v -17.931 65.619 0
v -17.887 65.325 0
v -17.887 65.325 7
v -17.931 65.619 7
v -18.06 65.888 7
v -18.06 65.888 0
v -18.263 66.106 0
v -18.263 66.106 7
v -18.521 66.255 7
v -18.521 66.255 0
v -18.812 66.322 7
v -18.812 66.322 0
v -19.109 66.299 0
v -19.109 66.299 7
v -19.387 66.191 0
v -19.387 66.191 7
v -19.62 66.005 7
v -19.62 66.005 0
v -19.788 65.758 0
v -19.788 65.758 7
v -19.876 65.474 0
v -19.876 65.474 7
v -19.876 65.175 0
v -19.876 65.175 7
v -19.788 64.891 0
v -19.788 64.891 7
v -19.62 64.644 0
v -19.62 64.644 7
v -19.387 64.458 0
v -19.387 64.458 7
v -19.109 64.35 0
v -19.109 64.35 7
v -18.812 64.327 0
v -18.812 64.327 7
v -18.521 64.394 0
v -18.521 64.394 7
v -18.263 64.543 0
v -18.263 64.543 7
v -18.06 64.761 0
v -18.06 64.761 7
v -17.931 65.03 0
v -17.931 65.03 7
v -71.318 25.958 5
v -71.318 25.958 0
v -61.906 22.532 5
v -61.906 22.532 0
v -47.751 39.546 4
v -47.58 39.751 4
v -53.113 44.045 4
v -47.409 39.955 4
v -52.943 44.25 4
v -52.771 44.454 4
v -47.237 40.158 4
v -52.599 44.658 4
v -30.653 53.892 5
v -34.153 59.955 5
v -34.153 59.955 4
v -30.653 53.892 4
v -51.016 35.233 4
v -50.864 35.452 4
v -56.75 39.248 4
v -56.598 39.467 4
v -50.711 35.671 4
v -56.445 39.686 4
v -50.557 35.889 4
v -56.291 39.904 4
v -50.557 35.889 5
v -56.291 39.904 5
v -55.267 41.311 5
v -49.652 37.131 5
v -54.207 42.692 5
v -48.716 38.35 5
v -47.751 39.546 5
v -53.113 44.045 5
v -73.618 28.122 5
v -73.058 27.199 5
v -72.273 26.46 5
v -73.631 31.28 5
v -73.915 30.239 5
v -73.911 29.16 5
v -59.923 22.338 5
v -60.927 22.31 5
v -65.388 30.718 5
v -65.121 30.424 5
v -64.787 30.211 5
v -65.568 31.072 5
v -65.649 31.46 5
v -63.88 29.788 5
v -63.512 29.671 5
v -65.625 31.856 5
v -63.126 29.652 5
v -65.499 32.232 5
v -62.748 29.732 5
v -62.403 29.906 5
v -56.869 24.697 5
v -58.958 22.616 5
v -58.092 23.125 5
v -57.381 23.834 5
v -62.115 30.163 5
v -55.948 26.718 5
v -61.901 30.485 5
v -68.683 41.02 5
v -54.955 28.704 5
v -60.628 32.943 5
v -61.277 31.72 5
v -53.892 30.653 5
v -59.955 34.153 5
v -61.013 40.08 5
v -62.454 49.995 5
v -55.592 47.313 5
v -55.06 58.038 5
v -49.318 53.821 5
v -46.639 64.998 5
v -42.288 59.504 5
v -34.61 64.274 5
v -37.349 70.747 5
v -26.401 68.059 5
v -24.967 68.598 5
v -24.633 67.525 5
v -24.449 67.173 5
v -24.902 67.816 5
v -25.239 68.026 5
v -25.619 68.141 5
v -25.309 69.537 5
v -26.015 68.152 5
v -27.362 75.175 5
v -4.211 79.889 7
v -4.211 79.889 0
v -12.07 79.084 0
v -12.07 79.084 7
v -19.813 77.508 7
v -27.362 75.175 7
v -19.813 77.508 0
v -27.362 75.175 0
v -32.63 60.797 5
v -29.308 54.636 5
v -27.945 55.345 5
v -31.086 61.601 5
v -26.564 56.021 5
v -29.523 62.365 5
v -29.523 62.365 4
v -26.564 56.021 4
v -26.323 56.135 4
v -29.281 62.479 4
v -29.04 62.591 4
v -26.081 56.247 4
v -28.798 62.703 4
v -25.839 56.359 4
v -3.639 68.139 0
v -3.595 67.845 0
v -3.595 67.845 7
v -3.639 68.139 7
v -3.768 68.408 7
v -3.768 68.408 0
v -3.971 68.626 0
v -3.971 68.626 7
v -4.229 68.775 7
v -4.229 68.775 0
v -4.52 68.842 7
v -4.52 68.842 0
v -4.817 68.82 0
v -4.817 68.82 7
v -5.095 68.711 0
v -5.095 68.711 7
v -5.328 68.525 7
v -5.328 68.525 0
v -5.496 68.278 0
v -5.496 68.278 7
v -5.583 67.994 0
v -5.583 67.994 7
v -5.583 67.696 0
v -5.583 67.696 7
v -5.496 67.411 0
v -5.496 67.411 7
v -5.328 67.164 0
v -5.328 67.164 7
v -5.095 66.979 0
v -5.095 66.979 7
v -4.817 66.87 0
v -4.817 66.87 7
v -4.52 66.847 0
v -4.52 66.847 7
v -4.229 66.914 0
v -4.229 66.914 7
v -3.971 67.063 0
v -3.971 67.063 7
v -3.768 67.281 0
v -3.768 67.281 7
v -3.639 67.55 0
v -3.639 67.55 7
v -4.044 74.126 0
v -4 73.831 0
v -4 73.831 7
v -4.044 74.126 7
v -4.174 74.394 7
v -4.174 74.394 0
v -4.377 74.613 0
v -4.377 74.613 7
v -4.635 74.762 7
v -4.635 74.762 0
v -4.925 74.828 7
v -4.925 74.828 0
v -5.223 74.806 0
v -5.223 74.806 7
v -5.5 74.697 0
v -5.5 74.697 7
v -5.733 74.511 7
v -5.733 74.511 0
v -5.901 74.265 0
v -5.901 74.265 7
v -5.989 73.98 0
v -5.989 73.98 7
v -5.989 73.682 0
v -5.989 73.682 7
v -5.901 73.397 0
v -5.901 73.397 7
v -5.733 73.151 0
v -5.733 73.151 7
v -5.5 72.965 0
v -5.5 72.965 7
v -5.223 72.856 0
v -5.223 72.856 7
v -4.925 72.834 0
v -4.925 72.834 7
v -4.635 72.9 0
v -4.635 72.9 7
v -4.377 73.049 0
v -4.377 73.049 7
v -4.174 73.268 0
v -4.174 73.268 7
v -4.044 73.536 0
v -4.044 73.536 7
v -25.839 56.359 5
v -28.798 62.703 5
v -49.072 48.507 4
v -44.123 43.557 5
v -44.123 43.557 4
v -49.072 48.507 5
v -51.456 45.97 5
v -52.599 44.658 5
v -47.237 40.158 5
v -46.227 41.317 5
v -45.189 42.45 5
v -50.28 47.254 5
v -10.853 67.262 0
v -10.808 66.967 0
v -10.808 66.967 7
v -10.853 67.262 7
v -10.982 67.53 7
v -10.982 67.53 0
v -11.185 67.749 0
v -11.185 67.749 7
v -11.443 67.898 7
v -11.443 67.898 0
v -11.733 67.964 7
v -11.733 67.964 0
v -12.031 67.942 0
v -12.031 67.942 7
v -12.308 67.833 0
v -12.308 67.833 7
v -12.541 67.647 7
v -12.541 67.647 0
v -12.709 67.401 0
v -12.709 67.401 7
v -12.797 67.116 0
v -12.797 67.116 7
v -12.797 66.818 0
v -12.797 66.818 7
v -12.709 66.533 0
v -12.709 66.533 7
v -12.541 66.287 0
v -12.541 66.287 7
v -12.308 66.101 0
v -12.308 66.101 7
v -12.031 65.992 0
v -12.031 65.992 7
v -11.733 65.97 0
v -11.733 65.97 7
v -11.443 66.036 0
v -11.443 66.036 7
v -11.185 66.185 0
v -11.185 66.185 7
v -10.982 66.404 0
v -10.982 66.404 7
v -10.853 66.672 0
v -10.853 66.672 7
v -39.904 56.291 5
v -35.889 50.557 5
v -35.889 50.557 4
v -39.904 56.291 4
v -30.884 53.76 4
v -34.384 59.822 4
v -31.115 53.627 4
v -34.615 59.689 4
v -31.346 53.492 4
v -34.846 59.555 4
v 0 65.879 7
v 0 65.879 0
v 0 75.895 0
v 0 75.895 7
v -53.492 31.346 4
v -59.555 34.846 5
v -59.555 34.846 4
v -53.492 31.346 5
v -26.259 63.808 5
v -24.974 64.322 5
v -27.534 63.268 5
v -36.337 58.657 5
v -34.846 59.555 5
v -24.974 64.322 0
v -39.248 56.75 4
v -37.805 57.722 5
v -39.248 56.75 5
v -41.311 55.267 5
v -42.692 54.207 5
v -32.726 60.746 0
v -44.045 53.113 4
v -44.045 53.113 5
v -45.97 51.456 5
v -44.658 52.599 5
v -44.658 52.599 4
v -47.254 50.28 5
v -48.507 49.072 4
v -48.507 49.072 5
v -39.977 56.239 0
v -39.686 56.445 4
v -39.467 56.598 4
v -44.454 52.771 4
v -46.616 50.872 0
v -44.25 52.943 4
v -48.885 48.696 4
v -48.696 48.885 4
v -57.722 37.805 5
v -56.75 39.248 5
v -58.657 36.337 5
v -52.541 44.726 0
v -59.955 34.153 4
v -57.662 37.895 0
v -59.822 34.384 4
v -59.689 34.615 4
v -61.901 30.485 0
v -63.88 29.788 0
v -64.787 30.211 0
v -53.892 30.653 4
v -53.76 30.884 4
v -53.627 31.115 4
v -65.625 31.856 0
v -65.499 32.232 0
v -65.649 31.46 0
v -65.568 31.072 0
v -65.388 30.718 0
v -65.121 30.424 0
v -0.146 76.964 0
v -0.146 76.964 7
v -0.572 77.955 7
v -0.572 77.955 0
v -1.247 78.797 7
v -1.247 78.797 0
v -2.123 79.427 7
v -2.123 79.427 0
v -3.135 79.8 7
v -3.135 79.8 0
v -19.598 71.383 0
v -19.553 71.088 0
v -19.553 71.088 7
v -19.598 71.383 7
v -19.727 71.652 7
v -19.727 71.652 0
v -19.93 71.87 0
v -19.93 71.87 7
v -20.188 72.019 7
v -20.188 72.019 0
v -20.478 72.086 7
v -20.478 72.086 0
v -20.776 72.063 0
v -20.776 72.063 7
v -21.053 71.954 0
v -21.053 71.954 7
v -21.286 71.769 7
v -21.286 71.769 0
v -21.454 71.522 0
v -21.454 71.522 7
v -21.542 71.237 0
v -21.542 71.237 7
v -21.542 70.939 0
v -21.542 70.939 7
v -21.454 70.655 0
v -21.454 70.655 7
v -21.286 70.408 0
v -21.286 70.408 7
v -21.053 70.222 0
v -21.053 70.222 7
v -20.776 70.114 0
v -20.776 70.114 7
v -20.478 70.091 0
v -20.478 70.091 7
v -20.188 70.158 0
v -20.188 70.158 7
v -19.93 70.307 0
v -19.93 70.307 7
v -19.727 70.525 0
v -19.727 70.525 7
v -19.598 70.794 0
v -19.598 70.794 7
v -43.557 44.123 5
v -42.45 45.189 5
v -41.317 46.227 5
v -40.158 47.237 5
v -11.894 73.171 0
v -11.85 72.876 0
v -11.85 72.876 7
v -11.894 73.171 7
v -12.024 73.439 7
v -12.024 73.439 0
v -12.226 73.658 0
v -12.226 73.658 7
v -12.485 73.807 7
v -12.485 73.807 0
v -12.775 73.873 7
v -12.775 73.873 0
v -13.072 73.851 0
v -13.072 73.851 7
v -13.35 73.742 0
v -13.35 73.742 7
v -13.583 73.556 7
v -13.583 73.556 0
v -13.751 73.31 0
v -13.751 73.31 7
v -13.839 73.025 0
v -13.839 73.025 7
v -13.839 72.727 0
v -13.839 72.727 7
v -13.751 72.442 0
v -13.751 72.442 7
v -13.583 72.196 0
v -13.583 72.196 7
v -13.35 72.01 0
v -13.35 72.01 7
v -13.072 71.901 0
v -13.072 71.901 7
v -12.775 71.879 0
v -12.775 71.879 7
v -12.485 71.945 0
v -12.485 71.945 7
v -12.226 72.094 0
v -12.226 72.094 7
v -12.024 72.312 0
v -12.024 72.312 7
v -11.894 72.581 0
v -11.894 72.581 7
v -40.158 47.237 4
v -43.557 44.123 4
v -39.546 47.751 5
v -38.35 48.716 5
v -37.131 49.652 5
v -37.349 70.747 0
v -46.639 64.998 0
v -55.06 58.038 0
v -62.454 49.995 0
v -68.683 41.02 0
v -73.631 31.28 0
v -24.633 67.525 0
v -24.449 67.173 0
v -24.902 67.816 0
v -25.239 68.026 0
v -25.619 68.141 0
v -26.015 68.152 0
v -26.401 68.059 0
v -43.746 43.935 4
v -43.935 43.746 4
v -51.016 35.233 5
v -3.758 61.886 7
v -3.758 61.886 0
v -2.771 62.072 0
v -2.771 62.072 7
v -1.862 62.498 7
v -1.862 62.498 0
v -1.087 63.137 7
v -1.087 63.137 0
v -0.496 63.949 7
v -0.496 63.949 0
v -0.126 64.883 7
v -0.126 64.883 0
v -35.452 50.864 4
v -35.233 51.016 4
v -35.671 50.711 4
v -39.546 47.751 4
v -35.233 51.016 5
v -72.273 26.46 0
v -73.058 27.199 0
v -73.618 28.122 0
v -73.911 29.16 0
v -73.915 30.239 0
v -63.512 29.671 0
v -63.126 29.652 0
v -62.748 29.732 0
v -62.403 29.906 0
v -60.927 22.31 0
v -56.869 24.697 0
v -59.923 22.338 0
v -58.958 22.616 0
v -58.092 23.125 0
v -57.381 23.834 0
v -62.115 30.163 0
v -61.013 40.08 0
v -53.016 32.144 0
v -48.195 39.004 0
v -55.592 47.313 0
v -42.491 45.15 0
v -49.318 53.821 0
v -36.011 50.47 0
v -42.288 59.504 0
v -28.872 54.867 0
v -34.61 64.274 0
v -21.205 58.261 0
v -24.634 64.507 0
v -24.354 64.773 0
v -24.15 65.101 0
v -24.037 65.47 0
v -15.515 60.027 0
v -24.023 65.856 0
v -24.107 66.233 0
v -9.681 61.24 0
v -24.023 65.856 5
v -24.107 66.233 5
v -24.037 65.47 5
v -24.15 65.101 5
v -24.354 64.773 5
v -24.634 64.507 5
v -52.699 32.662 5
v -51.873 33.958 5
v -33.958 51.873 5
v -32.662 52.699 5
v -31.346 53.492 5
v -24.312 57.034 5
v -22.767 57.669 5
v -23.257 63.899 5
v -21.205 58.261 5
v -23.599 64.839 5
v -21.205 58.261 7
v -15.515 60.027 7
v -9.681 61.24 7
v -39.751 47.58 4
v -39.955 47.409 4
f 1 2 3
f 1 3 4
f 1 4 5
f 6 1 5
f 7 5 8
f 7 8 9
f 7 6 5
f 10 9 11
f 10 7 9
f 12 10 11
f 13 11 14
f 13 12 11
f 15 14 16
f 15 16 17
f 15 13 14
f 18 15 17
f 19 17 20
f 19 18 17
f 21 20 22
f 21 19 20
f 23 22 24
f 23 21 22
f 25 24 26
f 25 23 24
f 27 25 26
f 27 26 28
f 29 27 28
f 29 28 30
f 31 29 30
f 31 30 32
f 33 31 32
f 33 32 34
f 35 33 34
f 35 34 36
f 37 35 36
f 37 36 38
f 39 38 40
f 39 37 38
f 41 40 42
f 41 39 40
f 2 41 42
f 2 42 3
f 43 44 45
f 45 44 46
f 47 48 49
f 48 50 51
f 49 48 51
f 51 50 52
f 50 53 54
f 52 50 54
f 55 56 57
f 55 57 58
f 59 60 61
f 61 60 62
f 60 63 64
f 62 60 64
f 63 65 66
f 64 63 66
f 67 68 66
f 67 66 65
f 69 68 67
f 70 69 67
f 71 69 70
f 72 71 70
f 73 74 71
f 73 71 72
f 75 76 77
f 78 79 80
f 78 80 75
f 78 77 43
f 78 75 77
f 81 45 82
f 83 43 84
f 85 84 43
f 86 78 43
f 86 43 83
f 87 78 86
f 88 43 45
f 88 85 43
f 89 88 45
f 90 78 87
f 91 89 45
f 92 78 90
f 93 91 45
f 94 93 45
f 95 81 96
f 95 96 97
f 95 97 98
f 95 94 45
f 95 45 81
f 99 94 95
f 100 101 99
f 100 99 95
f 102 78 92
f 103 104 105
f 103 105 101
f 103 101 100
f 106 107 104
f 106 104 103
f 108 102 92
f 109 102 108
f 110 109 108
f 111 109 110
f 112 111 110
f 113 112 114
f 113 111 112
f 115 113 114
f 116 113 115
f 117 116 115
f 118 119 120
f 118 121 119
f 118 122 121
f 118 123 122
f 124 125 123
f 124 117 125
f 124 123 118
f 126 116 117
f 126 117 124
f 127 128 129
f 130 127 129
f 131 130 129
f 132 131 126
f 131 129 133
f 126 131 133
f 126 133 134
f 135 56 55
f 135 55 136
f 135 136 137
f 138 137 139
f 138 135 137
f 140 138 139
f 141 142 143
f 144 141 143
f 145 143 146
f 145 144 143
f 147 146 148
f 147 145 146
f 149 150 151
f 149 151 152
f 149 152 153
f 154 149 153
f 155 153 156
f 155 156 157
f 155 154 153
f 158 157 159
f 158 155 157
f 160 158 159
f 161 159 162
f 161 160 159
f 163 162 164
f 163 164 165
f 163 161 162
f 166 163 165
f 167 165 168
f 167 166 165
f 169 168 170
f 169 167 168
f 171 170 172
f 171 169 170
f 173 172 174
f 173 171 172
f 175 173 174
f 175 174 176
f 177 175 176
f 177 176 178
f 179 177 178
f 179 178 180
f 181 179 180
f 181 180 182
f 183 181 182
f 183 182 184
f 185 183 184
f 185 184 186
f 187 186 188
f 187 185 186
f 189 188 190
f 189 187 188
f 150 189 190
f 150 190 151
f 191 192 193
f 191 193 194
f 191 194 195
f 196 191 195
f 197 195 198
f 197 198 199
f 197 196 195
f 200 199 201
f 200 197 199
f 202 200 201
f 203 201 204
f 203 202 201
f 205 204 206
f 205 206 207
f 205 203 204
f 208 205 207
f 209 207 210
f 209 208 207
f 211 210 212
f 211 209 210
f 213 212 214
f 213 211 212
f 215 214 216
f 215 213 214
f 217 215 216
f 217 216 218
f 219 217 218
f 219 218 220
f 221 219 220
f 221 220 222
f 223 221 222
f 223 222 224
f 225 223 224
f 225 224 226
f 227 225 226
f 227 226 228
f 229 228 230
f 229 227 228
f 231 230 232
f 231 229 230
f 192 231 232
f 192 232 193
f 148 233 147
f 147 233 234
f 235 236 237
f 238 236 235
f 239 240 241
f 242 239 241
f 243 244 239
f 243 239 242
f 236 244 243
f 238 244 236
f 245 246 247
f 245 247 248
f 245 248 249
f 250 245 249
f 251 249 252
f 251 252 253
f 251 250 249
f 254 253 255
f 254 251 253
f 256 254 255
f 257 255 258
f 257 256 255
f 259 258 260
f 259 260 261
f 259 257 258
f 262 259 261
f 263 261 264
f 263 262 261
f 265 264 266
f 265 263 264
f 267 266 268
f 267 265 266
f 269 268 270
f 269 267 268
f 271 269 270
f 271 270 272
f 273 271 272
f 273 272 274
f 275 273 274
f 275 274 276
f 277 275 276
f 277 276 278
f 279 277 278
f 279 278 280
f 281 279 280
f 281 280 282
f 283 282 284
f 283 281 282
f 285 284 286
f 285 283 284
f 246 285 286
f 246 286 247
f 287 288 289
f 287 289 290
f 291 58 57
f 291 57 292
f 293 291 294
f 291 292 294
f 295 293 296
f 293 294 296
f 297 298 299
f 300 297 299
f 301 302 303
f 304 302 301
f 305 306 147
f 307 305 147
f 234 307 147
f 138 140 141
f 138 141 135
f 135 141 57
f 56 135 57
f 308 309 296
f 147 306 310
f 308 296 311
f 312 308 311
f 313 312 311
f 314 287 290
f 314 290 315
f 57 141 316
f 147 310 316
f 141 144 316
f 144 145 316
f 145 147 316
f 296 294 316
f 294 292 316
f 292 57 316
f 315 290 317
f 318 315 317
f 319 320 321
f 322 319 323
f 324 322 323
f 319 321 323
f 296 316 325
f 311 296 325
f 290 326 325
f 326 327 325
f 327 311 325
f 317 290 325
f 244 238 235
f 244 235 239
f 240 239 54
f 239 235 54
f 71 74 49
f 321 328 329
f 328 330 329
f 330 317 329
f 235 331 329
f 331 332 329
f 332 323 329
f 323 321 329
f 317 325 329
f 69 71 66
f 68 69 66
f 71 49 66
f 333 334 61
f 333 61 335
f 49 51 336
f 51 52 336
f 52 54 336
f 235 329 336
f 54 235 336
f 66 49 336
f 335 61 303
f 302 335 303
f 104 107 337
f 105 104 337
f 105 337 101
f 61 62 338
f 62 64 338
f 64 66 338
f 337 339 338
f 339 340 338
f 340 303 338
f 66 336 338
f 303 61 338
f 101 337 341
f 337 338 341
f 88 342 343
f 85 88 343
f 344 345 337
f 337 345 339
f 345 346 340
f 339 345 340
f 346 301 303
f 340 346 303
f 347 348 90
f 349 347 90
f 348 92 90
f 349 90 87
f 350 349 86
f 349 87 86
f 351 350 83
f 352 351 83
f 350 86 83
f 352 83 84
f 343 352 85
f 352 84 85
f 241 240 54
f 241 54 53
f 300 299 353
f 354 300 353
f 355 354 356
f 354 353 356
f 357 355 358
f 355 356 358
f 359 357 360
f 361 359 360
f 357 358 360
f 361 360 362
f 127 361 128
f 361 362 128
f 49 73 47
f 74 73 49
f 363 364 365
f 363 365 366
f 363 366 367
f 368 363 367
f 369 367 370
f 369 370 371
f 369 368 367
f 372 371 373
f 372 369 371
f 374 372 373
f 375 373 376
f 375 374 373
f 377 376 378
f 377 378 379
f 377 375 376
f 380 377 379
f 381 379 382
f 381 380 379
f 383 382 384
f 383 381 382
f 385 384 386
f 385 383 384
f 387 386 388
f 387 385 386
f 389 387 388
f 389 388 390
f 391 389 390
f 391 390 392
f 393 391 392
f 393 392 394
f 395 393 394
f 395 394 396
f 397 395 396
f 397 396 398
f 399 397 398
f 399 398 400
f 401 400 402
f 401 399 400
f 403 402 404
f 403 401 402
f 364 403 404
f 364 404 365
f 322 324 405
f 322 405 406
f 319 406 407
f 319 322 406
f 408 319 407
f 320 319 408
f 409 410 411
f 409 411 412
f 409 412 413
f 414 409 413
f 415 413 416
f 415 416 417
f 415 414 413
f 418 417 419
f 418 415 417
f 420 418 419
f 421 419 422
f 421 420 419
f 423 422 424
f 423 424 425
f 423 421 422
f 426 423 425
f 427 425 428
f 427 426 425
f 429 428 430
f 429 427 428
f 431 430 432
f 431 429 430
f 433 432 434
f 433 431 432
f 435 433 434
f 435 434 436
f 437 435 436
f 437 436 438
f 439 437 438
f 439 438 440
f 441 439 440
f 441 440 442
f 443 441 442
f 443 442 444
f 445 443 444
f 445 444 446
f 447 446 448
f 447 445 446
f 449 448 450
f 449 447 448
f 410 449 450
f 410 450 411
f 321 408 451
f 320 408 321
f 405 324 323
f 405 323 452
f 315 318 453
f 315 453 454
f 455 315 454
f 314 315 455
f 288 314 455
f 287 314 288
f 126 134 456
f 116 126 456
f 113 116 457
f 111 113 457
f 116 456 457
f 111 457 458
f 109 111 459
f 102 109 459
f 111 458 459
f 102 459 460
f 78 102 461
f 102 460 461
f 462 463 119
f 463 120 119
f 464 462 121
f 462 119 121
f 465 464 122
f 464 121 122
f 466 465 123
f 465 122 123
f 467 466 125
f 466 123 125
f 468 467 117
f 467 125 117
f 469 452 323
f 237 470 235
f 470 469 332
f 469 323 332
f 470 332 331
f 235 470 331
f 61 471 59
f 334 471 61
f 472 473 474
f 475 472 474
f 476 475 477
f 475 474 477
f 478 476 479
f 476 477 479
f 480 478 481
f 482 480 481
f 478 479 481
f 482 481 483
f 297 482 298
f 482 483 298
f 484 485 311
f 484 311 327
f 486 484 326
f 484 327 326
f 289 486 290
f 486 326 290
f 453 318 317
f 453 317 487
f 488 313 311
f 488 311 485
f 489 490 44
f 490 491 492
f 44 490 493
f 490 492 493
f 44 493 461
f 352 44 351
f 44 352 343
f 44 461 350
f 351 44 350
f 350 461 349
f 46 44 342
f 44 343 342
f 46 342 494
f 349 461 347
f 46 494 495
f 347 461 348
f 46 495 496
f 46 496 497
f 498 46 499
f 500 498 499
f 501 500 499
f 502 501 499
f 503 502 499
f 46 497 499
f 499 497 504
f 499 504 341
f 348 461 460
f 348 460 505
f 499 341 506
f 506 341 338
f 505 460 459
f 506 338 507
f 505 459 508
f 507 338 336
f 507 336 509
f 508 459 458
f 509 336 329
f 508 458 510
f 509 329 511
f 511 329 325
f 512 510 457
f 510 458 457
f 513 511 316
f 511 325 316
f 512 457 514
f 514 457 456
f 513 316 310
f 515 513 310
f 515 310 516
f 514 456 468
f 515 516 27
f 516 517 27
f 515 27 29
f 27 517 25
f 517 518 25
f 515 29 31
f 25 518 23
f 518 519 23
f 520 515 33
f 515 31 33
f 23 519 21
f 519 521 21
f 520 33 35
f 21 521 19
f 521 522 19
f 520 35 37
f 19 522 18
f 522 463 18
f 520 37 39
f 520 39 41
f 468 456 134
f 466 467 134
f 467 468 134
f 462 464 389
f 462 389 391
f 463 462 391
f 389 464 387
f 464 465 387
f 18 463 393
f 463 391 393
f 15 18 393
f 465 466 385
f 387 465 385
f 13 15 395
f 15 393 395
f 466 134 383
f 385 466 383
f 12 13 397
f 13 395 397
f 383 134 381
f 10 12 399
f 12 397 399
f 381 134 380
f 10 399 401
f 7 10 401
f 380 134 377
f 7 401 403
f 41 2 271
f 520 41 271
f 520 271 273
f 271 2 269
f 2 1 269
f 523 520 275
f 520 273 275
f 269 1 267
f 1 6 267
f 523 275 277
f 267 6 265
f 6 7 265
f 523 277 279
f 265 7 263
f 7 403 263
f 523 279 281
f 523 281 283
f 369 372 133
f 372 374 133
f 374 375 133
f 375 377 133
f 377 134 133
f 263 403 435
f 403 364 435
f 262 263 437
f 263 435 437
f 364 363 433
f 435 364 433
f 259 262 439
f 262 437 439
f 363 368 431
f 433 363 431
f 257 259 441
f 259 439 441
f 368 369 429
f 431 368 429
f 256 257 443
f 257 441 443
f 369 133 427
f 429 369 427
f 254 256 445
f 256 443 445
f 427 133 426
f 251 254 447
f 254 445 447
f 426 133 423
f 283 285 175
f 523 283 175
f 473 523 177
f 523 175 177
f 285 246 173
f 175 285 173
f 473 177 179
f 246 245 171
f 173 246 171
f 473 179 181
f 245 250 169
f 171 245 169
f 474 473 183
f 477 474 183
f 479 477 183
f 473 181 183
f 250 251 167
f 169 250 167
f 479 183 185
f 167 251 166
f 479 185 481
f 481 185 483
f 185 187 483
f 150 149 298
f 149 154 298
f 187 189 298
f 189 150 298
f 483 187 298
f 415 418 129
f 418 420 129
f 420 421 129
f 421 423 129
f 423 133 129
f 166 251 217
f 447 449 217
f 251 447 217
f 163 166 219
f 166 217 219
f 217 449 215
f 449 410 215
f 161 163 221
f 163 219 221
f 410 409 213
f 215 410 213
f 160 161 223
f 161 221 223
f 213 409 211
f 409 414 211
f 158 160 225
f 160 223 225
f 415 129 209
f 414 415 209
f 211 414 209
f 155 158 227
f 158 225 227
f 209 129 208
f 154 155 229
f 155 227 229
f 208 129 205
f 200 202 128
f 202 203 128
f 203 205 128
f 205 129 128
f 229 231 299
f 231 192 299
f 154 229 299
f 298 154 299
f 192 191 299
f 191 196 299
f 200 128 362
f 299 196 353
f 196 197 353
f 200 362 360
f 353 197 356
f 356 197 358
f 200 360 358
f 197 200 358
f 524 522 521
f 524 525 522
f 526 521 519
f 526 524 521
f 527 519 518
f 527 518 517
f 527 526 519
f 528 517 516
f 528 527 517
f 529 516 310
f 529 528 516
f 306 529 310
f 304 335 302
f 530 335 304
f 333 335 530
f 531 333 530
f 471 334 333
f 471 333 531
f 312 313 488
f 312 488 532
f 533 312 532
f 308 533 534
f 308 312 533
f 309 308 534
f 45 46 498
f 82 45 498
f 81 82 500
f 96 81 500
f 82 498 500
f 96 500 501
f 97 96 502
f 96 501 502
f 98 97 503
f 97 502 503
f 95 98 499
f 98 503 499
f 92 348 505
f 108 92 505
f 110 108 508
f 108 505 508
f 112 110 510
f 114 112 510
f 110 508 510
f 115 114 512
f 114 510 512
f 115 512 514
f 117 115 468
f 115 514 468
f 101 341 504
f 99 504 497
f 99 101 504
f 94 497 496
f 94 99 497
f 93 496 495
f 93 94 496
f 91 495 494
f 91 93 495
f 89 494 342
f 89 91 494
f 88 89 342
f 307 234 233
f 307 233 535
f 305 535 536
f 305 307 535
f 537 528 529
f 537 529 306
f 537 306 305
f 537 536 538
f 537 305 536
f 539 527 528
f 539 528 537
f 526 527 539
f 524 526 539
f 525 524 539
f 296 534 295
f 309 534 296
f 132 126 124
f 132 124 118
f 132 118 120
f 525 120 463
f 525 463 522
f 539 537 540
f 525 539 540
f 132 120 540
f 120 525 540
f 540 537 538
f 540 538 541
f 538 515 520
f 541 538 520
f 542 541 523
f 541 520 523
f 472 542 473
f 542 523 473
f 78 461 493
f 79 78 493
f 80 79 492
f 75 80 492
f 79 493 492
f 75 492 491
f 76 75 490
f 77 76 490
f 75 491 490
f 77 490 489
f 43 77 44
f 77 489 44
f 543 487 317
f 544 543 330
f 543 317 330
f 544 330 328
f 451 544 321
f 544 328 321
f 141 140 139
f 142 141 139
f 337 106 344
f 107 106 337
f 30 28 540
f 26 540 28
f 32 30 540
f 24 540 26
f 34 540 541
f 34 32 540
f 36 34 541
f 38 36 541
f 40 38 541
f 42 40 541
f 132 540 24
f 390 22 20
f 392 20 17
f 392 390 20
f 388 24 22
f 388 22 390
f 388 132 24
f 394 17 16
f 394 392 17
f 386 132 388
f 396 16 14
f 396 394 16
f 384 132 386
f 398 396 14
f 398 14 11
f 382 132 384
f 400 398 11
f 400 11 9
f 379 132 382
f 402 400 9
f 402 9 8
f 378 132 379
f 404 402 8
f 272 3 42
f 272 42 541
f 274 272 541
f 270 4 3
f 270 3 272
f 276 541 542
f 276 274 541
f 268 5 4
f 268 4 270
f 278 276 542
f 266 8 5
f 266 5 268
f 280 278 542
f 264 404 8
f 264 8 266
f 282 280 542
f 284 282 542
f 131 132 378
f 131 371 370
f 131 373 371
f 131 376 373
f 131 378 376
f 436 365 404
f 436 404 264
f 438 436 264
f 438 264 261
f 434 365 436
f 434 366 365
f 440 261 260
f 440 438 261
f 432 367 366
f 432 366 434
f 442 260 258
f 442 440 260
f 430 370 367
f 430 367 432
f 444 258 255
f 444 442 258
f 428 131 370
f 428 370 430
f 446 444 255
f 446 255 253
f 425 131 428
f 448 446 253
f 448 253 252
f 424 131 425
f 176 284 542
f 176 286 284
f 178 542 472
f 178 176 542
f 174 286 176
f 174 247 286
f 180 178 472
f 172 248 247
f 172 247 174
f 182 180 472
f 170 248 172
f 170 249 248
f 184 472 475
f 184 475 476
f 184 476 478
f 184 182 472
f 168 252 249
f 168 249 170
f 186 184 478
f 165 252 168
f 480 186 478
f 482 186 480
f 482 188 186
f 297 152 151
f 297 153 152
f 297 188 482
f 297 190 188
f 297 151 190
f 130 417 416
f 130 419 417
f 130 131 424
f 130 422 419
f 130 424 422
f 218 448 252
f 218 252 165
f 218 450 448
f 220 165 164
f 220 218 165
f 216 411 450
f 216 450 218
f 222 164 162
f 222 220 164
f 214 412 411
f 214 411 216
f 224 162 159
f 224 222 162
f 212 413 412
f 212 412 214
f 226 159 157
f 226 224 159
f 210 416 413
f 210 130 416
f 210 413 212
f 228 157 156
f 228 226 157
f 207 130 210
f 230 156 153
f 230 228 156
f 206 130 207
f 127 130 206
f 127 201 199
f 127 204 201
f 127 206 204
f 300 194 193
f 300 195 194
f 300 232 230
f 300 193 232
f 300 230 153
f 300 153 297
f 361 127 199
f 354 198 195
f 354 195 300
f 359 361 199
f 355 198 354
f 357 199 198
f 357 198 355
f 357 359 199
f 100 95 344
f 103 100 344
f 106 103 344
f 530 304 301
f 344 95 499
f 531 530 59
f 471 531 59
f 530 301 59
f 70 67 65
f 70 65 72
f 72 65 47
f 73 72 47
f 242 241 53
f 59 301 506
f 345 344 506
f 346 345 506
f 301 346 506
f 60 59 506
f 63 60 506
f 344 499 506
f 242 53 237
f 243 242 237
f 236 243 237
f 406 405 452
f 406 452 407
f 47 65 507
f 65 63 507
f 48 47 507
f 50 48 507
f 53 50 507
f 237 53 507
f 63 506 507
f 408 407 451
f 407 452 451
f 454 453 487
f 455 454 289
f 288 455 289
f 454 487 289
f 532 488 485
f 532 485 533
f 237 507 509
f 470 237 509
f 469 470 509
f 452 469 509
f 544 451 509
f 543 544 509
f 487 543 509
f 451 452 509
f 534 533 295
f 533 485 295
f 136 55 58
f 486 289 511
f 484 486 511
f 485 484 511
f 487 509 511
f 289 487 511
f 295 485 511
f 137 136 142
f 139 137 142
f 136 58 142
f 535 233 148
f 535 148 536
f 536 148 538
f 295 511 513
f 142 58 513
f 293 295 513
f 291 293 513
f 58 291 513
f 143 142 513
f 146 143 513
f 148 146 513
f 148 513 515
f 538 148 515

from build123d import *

# Parameters (mm, degrees)
BOSS_EXTRUDE2_DEPTH = 5
SKETCH1_5_R         = 1
BOSS_EXTRUDE3_DEPTH = 7
FILLET1_R           = 1.5
CUT_EXTRUDE1_DEPTH  = 1


with BuildPart() as part:
    # Sketch1 → Boss-Extrude2 (new body)
    with BuildSketch(Plane.XY):
        with BuildLine():
            ThreePointArc((-56.868678478, 24.697234828), (-42.491353844, 45.149583038), (-21.205248886, 58.260942489))
            Line((-21.205248886, 58.260942489), (-23.257369746, 63.899098213))
            Line((-23.257369746, 63.899098213), (-23.599389889, 64.838790834))
            ThreePointArc((-23.599389889, 64.838790834), (-46.615724325, 50.87213624), (-62.535237306, 29.16066006))
            Line((-62.535237306, 29.16066006), (-66.160468454, 30.851133107))
            ThreePointArc((-66.160468454, 30.851133107), (-49.318085156, 53.821245587), (-24.967470463, 68.597561317))
            Line((-24.967470463, 68.597561317), (-25.309490606, 69.537253938))
            Line((-25.309490606, 69.537253938), (-27.361611466, 75.175409663))
            ThreePointArc((-27.361611466, 75.175409663), (-55.059776129, 58.038100009), (-73.631131577, 31.280288725))
            ThreePointArc((-73.631131577, 31.280288725), (-73.618051339, 28.121820986), (-71.317655571, 25.957503806))
            Line((-71.317655571, 25.957503806), (-61.90570605, 22.531834333))
            ThreePointArc((-61.90570605, 22.531834333), (-58.95783549, 22.615790046), (-56.868678478, 24.697234828))
        make_face()
    extrude(amount=BOSS_EXTRUDE2_DEPTH)

    # Sketch1<5> → Boss-Extrude3 (add)
    with BuildSketch(Plane.XY):
        with BuildLine():
            ThreePointArc((-21.205248886, 58.260942489), (-12.61233393, 60.703616308), (-3.757575758, 61.886029315))
            ThreePointArc((-3.757575758, 61.886029315), (-1.087123675, 63.137298701), (0, 65.878676368))
            Line((0, 65.878676368), (0, 75.894663844))
            ThreePointArc((0, 75.894663844), (-1.247011194, 78.796568844), (-4.210526316, 79.889119836))
            ThreePointArc((-4.210526316, 79.889119836), (-15.961038091, 78.39161475), (-27.361611466, 75.175409663))
            Line((-27.361611466, 75.175409663), (-21.205248886, 58.260942489))
        make_face()
        with Locations((-4.594594595, 67.844599641)):
            Circle(SKETCH1_5_R, mode=Mode.SUBTRACT)
        with Locations((-11.808076081, 66.966927205)):
            Circle(SKETCH1_5_R, mode=Mode.SUBTRACT)
        with Locations((-18.886713057, 65.324513545)):
            Circle(SKETCH1_5_R, mode=Mode.SUBTRACT)
        with Locations((-5, 73.830887845)):
            Circle(SKETCH1_5_R, mode=Mode.SUBTRACT)
        with Locations((-12.849965147, 72.875773723)):
            Circle(SKETCH1_5_R, mode=Mode.SUBTRACT)
        with Locations((-20.553187739, 71.088441211)):
            Circle(SKETCH1_5_R, mode=Mode.SUBTRACT)
    extrude(amount=BOSS_EXTRUDE3_DEPTH)

    # Fillet1
    fillet1_edges = [part.edges().sort_by_distance(p)[0] for p in [
        (-66.160468454, 30.851133107, 2.5),
        (-62.535237306, 29.16066006, 2.5),
        (-23.599389889, 64.838790834, 2.5),
        (-24.967470463, 68.597561317, 2.5),
    ]]
    fillet(fillet1_edges, radius=FILLET1_R)

    # Sketch2 → Cut-Extrude1 (cut)
    with BuildSketch(Plane.XY.offset(5)):
        Polygon((-26.182734595, 55.202574904), (-25.457688366, 55.540669514), (-29.670325491, 64.574698983), (-30.395371721, 64.236604373), align=None)
        Polygon((-30.894322803, 52.71053676), (-35.87829712, 61.343033502), (-35.185476797, 61.743033502), (-30.20150248, 53.11053676), align=None)
        Polygon((-35.370786559, 49.817339603), (-41.088167015, 57.982605105), (-40.43284538, 58.441466254), (-34.715464924, 50.276200752), align=None)
        Polygon((-39.578057272, 46.545002412), (-45.985331149, 54.180894073), (-45.372495595, 54.695124161), (-38.965221718, 47.059232499), align=None)
        Polygon((-43.484115072, 42.918429647), (-50.532519147, 49.966833722), (-49.966833722, 50.532519147), (-42.918429647, 43.484115072), align=None)
        Polygon((-47.059232499, 38.965221718), (-54.695124161, 45.372495595), (-54.180894073, 45.985331149), (-46.545002412, 39.578057272), align=None)
        Polygon((-50.276200752, 34.715464924), (-58.441466254, 40.43284538), (-57.982605105, 41.088167015), (-49.817339603, 35.370786559), align=None)
        Polygon((-53.11053676, 30.20150248), (-61.743033502, 35.185476797), (-61.343033502, 35.878297121), (-52.71053676, 30.894322803), align=None)
    extrude(amount=-CUT_EXTRUDE1_DEPTH, mode=Mode.SUBTRACT)


solid = part.part
